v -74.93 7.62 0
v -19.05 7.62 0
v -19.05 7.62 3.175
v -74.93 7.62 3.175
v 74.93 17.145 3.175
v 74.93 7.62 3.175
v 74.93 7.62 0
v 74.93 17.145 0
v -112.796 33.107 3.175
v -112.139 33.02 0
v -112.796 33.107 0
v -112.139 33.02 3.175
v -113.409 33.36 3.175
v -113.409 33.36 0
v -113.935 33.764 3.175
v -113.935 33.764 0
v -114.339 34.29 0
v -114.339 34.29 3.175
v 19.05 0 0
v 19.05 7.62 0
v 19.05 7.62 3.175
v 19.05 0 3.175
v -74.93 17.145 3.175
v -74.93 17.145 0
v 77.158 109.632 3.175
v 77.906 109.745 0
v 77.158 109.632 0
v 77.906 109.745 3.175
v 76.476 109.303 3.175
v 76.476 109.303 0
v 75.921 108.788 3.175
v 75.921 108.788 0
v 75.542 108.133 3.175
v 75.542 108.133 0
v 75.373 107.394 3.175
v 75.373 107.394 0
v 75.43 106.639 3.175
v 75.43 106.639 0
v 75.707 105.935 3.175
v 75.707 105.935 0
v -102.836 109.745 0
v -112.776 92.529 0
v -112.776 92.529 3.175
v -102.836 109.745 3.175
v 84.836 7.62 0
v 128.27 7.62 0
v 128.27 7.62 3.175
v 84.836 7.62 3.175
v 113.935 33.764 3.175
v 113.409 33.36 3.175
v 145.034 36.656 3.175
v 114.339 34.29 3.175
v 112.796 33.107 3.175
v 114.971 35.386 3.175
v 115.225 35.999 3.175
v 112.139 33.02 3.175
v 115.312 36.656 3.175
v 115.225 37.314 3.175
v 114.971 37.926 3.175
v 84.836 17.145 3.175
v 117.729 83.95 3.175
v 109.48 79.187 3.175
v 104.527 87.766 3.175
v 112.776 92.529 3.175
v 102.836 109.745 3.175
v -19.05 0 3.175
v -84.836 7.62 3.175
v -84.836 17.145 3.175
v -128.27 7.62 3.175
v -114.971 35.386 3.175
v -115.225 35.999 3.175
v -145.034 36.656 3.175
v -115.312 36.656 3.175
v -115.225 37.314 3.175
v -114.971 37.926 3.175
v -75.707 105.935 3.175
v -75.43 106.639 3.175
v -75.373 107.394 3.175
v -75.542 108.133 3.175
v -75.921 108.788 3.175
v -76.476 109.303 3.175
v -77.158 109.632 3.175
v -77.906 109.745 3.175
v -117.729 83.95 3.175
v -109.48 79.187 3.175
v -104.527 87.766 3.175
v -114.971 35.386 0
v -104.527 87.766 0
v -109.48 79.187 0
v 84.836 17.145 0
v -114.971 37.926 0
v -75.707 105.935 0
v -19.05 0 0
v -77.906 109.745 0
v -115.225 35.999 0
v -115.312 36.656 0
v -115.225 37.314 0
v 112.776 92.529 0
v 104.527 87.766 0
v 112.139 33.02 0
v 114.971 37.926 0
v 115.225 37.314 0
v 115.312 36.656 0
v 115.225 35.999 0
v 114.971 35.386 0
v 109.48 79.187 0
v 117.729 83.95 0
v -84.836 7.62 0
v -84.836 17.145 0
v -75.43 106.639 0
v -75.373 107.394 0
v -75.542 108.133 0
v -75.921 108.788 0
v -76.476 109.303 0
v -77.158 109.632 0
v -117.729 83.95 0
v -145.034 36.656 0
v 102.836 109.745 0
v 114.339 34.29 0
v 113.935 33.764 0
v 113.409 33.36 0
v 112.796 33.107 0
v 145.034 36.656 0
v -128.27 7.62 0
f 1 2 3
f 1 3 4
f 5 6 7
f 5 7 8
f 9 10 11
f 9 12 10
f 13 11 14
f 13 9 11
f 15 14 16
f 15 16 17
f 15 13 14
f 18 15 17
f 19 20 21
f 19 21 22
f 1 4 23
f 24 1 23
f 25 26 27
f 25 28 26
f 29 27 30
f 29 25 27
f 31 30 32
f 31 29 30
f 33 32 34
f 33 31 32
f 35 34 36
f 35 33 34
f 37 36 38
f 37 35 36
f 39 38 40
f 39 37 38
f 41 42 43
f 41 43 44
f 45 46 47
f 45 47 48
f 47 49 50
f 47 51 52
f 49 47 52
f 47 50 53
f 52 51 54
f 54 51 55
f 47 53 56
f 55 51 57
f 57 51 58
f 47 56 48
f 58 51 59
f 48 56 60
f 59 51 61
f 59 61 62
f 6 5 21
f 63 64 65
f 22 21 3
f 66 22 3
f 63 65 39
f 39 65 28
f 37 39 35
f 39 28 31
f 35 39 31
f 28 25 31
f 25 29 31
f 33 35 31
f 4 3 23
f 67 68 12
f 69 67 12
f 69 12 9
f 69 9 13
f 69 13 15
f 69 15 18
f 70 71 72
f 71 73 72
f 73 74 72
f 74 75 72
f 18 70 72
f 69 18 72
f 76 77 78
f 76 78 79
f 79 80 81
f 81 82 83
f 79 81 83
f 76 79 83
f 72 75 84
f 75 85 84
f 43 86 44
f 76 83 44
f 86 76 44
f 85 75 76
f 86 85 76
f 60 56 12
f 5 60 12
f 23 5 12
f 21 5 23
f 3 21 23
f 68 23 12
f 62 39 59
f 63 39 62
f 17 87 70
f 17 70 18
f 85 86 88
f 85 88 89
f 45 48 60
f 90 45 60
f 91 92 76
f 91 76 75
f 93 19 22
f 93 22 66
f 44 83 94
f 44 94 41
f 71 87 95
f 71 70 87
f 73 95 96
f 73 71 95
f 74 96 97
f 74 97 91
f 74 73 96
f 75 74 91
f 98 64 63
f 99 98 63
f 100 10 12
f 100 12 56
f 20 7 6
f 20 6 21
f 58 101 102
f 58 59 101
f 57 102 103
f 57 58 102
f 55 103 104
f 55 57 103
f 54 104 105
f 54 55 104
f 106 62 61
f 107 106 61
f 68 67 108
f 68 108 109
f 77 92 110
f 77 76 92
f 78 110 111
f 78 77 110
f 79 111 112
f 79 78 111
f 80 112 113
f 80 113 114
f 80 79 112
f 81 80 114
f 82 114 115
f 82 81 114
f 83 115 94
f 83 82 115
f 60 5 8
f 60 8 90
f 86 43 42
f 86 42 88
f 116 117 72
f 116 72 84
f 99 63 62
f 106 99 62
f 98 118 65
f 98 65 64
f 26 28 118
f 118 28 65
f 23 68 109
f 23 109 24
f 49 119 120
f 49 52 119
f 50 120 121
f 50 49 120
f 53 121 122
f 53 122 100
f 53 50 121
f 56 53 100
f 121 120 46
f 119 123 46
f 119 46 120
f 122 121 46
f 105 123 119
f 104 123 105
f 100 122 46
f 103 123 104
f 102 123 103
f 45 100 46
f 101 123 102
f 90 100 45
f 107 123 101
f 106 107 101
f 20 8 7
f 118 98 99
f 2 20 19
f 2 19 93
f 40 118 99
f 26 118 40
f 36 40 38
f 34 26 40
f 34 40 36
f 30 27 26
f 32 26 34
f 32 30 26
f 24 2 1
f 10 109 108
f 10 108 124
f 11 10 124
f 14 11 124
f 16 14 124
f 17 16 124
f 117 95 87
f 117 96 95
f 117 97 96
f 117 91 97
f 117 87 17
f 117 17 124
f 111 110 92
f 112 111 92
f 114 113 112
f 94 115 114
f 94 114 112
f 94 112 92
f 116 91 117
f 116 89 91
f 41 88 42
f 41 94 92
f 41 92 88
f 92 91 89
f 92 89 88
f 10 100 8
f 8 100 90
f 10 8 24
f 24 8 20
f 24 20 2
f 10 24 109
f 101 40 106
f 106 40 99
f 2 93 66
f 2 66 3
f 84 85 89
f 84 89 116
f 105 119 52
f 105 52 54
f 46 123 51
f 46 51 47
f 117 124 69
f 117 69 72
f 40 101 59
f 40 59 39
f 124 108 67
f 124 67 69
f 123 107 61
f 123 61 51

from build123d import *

# Parameters (mm, degrees)
BOSS_EXTRUDE1_DEPTH = 3.175
SKETCH2_W           = 9.906
SKETCH2_H           = 9.525
CUT_EXTRUDE1_DEPTH  = 190.835760674
FILLET1_R           = 2.54


with BuildPart() as part:
    # Sketch1 → Boss-Extrude1 (new body)
    with BuildSketch(Plane.XY):
        Polygon((19.05, 0), (-19.05, 0), (-19.05, 7.62), (-128.27, 7.62), (-145.034, 36.656099738), (-95.504, 122.444576237), (-73.506954744, 109.744576237), (-115.704606325, 36.656099738), (-113.605303163, 33.02), (113.605303163, 33.02), (115.704606325, 36.656099738), (73.506954744, 109.744576237), (95.504, 122.444576237), (145.034, 36.656099738), (128.27, 7.62), (19.05, 7.62), align=None)
    extrude(amount=BOSS_EXTRUDE1_DEPTH)

    # Sketch2 → Cut-Extrude1 (cut, through all)
    with BuildSketch(Plane.XY.offset(3.175)):
        with Locations((-79.883, 12.3825)):
            Rectangle(SKETCH2_W, SKETCH2_H)
        Polygon((-112.776, 92.528594689), (-104.527108029, 87.766094689), (-109.480108029, 79.187247039), (-117.729, 83.949747039), align=None)
        Polygon((-73.506954744, 109.744576237), (-102.836348419, 109.744576237), (-95.504, 122.444576237), align=None)
        Polygon((95.504, 122.444576237), (73.506954744, 109.744576237), (102.836348419, 109.744576237), align=None)
        Polygon((117.729, 83.949747039), (112.776, 92.528594689), (104.527108029, 87.766094689), (109.480108029, 79.187247039), align=None)
        with Locations((79.883, 12.3825)):
            Rectangle(SKETCH2_W, SKETCH2_H)
    extrude(amount=-CUT_EXTRUDE1_DEPTH, mode=Mode.SUBTRACT)

    # Fillet1
    fillet1_edges = [part.edges().sort_by_distance(p)[0] for p in [
        (-113.605303163, 33.02, 1.5875),
        (113.605303163, 33.02, 1.5875),
        (115.704606325, 36.656099738, 1.5875),
        (73.506954744, 109.744576237, 1.5875),
        (-73.506954744, 109.744576237, 1.5875),
        (-115.704606325, 36.656099738, 1.5875),
    ]]
    fillet(fillet1_edges, radius=FILLET1_R)


solid = part.part
